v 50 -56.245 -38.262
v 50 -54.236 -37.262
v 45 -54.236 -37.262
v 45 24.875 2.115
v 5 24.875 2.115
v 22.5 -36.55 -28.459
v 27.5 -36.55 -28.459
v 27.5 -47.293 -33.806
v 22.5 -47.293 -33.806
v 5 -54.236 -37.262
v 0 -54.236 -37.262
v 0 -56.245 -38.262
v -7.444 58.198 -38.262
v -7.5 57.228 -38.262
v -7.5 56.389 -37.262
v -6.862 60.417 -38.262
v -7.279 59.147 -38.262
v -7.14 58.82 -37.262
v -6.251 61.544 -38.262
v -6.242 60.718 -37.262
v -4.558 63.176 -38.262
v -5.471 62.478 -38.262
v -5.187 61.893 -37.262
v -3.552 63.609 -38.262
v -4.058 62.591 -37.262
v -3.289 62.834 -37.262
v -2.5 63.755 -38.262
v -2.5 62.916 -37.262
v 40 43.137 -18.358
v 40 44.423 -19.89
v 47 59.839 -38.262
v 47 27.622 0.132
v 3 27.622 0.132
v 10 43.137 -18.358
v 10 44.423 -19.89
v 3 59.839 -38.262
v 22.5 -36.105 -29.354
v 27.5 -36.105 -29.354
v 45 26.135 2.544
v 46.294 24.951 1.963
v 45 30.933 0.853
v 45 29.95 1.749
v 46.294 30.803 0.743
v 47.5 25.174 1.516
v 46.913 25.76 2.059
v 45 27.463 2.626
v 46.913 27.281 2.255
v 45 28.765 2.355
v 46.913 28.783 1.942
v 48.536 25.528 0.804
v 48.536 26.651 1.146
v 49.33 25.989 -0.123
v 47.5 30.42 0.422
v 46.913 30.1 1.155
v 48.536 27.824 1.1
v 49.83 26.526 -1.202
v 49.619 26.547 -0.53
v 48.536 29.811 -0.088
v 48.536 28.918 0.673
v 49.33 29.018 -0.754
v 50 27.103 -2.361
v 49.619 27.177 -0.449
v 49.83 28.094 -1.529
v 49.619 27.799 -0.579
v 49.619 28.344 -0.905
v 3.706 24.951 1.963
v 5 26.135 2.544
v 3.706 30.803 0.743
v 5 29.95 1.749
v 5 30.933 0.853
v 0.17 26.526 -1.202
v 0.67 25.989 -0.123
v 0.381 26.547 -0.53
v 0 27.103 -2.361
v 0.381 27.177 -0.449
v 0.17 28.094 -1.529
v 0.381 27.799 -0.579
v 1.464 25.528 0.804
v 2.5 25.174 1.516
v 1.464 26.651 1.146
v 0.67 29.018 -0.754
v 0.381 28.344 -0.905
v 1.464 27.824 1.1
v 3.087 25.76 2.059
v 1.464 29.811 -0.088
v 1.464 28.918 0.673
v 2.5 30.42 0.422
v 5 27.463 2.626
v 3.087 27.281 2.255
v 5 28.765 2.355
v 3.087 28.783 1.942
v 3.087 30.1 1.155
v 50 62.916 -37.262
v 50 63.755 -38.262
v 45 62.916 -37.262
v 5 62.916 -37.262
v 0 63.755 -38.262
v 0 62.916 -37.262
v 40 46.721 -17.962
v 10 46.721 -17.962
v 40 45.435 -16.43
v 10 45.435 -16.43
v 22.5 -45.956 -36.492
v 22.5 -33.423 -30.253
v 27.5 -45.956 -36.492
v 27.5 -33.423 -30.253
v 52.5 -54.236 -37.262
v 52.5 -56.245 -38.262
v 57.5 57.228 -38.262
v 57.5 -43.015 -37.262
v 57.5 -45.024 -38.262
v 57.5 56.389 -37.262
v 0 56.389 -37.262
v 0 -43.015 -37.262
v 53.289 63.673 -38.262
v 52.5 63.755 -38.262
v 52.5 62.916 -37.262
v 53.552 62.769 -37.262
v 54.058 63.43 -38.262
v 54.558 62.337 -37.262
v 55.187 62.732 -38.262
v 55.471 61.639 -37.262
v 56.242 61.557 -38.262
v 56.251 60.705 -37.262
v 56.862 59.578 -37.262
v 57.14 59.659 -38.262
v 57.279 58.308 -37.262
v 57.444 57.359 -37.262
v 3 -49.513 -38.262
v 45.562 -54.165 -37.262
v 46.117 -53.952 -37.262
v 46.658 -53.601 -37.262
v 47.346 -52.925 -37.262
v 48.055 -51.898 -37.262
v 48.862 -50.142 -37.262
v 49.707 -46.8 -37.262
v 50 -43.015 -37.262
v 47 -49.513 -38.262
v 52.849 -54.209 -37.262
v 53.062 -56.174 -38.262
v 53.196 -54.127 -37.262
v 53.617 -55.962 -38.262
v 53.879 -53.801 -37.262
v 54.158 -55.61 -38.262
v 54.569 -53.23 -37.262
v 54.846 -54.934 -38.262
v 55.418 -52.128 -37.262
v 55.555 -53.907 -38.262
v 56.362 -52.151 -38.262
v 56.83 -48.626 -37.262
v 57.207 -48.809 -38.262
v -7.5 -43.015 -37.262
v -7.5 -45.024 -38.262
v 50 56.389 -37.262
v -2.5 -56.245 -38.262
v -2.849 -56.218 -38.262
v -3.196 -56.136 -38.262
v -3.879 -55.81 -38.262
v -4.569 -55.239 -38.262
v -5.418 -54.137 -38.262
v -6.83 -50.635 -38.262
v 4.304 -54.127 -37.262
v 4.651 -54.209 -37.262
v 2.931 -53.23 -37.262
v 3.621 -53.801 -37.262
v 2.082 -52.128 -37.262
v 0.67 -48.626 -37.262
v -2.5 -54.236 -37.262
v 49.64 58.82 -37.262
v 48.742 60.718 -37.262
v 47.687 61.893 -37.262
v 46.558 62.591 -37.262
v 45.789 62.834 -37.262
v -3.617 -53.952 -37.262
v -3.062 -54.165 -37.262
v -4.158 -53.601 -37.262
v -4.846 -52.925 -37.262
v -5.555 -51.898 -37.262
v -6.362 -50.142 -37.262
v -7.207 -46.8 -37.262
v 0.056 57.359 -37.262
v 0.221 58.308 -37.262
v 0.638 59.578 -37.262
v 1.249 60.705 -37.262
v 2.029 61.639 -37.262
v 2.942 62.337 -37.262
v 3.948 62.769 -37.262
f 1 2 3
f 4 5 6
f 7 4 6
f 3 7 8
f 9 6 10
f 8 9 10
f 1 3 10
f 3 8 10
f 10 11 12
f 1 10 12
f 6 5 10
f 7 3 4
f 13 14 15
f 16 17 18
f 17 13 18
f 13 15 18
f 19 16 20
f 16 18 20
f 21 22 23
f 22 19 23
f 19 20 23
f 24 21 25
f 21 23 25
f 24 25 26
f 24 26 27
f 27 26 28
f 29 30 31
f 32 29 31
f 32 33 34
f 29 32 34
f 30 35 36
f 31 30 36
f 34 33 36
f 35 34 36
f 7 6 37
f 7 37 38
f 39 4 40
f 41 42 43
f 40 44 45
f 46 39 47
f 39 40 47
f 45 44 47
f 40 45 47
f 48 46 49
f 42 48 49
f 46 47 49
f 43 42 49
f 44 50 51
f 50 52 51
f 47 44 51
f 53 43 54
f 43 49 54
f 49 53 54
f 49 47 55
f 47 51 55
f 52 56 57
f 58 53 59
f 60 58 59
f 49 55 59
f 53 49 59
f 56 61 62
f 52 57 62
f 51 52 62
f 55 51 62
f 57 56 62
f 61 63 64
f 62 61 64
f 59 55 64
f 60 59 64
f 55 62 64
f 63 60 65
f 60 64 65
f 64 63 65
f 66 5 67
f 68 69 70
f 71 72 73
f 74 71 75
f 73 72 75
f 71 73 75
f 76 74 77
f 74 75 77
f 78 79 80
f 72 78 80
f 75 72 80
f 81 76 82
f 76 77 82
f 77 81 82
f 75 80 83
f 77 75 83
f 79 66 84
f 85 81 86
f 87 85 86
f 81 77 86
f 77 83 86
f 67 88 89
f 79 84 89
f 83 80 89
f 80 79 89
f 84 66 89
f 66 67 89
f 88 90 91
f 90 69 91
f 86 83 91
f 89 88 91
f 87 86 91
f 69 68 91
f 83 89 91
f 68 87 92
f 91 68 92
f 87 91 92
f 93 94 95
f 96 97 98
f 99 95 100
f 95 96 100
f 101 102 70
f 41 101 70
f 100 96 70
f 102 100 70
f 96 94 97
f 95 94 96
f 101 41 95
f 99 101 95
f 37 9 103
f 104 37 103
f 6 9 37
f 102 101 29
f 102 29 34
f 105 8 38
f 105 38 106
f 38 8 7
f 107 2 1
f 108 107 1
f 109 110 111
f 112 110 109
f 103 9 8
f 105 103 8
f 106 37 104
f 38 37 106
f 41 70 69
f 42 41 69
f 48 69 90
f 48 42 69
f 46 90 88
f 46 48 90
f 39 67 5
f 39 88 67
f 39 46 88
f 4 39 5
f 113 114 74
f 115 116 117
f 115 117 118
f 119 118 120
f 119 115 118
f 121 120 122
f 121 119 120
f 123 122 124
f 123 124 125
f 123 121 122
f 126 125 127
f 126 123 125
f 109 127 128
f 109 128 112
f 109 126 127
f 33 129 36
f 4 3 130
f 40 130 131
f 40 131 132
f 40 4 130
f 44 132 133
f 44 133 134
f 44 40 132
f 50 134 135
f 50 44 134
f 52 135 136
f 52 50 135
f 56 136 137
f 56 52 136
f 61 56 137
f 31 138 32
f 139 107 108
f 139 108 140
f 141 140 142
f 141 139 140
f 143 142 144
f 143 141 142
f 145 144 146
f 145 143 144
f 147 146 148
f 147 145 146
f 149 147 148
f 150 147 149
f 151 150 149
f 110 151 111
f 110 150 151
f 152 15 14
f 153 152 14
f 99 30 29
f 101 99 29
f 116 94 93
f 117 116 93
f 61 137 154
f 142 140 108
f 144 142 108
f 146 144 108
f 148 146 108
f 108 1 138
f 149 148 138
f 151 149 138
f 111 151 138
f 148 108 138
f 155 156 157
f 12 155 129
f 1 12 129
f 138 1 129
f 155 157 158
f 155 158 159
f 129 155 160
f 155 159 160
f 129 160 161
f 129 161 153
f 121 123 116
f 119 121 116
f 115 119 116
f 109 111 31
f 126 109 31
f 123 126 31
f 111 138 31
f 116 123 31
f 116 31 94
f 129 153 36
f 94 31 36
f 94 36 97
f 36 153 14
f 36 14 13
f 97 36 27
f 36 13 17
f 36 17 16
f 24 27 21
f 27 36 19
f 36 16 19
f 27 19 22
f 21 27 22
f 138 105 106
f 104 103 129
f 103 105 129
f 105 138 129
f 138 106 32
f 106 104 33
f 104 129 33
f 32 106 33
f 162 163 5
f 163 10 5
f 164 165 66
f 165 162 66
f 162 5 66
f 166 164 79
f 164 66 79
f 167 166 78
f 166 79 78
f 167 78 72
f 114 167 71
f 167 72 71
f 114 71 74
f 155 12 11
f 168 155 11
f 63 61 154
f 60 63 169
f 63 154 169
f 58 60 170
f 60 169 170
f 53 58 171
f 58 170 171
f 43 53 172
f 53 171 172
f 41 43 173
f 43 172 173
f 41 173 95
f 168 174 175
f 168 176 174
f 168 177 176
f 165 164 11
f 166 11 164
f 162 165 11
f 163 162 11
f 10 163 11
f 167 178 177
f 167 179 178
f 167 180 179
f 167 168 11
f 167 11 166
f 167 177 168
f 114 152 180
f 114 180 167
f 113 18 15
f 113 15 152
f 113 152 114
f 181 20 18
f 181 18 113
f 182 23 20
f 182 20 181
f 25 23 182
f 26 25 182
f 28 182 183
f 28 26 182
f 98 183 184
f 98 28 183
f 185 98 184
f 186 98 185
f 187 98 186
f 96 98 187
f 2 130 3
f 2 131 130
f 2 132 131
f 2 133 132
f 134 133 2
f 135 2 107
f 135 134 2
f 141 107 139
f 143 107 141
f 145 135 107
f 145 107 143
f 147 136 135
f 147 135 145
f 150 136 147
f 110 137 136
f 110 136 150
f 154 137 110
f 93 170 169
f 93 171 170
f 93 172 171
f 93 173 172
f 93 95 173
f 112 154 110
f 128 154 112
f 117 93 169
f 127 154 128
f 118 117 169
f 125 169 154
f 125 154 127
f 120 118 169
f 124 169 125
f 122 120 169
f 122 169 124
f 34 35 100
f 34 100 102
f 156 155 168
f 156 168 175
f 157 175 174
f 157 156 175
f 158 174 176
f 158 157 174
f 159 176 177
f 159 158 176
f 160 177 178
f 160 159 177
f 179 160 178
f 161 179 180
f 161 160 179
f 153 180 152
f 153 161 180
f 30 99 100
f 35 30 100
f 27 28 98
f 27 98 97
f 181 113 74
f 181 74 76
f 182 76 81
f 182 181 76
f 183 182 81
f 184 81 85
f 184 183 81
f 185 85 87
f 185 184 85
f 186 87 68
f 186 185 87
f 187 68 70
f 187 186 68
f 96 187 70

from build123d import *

# Parameters (mm, degrees)
F1_DEPTH      = 50
F2_DEPTH      = 3
F4_DEPTH      = 3
F5_W          = 30
F5_H          = 2
F6_DEPTH      = 25
F7_W          = 5
F7_H          = 12
F8_DEPTH      = 25
F9_SIZE       = 2
F11_DEPTH     = 7.5
F12_T1_DEPTH  = 26.3054072893
F13_T1_DEPTH  = 27.2441766919
F15_DEPTH     = 7.5
F16_T1_DEPTH  = 26.3054072893
F17_T1_DEPTH  = 27.2441766919
F18_R         = 5
F19_T4_DEPTH  = 100.8695078042
F19_T7_ANGLE  = 76.4615865705
F19_T11_DEPTH = 62.2556275763
F20_T4_DEPTH  = 100.8695078042
F20_T9_DEPTH  = 62.2556275763
F20_T12_ANGLE = 76.4615865705


# Not quite as in the source:
# - a fillet or chamfer that OpenCascade refuses, or shapes differently, is made with other operations: its cross-section is extruded or revolved along the edge and cut away or added


with BuildPart() as f1:
    # F0 (on Right) → F1 (new body)
    with BuildSketch(Plane.YZ):
        Polygon((28.4014230277, 3.870410641), (-56.2452584396, -38.2620337305), (-49.5127283639, -38.2620337305), (27.6224404883, 0.1315944002), (59.8385196924, -38.2620337305), (63.7547415604, -38.2620337305), align=None)
    extrude(amount=F1_DEPTH)

    # F0 (on Right) → F2 (join)
    with BuildSketch(Plane.YZ):
        Polygon((27.6224404883, 0.1315944002), (-49.5127283639, -38.2620337305), (59.8385196924, -38.2620337305), align=None)
    extrude(amount=F2_DEPTH)

    # F3 (on face) → F4 (join)
    with BuildSketch(Plane.YZ.offset(50)):
        Polygon((27.6224404883, 0.1315944002), (-49.5127283639, -38.2620337305), (59.8385196924, -38.2620337305), align=None)
    extrude(amount=-F4_DEPTH)

    # F5 (on face) → F6 (cut)
    with BuildSketch(Plane(origin=(0, 18.5724443931, 15.5841312403), x_dir=(-1, 0, 0), z_dir=(0, 0.7660444431, 0.6427876097))):
        with Locations((-25, -42.7911762555)):
            Rectangle(F5_W, F5_H)
    extrude(amount=-F6_DEPTH, mode=Mode.SUBTRACT)

    # F7 (on face) → F8 (cut)
    with BuildSketch(Plane(origin=(0, 4.0953498153, -8.2278105741), x_dir=(1, 0, 0), z_dir=(0, -0.4455977123, 0.8952333097))):
        with Locations((25, -51.4021035664)):
            Rectangle(F7_W, F7_H)
    extrude(amount=-F8_DEPTH, mode=Mode.SUBTRACT)

    # F9
    f9_edges = [f1.edges().sort_by_distance(p)[0] for p in [
        (25, -35.213332, -31.144584),
    ]]
    chamfer(f9_edges, length=F9_SIZE)

    # F10 (on face) → F11 (join)
    with BuildSketch(Plane(origin=(0, 0, 0), x_dir=(0, -1, 0), z_dir=(-1, 0, 0))):
        Polygon((56.2452584396, -38.2620337305), (54.2361967122, -37.2620337305), (-62.9156419292, -37.2620337305), (-63.7547415604, -38.2620337305), align=None)
    extrude(amount=F11_DEPTH)

    # F12: fillet of radius 5 on 1 edges, made by hand

    # F12_s2 → F12_t1 (cut)
    with BuildSketch(Plane(origin=(0, 36.3083524151, -43.2706094318), x_dir=(1, 0, 0), z_dir=(0, 0.6427876097, -0.7660444431))):
        with BuildLine():
            ThreePointArc((-7.5, -19.2446042914), (-6.0355339059, -22.7801381974), (-2.5, -24.2446042914))
            Line((-2.5, -24.2446042914), (-7.5, -24.2446042914))
            Line((-7.5, -24.2446042914), (-7.5, -19.2446042914))
        make_face()
    extrude(amount=F12_T1_DEPTH, mode=Mode.SUBTRACT)

    # F13: fillet of radius 5 on 1 edges, made by hand

    # F13_s2 → F13_t1 (cut)
    with BuildSketch(Plane(origin=(0, -71.5310246258, -35.6041945608), x_dir=(1, 0, 0), z_dir=(0, 0.8952333097, 0.4455977123))):
        with BuildLine():
            ThreePointArc((-2.5, 9.1906886005), (-6.0355339059, 10.6551546946), (-7.5, 14.1906886005))
            Line((-7.5, 14.1906886005), (-7.5, 9.1906886005))
            Line((-7.5, 9.1906886005), (-2.5, 9.1906886005))
        make_face()
    extrude(amount=F13_T1_DEPTH, mode=Mode.SUBTRACT)

    # F14 (on face) → F15 (join)
    with BuildSketch(Plane.YZ.offset(50)):
        Polygon((63.7547415604, -38.2620337305), (62.9156419292, -37.2620337305), (-54.2361967122, -37.2620337305), (-56.2452584396, -38.2620337305), align=None)
    extrude(amount=F15_DEPTH)

    # F16: fillet of radius 5 on 1 edges, made by hand

    # F16_s2 → F16_t1 (cut)
    with BuildSketch(Plane(origin=(0, 53.2171422884, -63.4217205098), x_dir=(1, 0, 0), z_dir=(0, -0.6427876097, 0.7660444431))):
        with BuildLine():
            ThreePointArc((52.5, 24.2446042914), (56.0355339059, 22.7801381974), (57.5, 19.2446042914))
            Line((57.5, 19.2446042914), (57.5, 24.2446042914))
            Line((57.5, 24.2446042914), (52.5, 24.2446042914))
        make_face()
    extrude(amount=F16_T1_DEPTH, mode=Mode.SUBTRACT)

    # F17: fillet of radius 5 on 1 edges, made by hand

    # F17_s2 → F17_t1 (cut)
    with BuildSketch(Plane(origin=(0, -47.1411301566, -23.4642517522), x_dir=(1, 0, 0), z_dir=(0, -0.8952333097, -0.4455977123))):
        with BuildLine():
            ThreePointArc((52.5, -9.1906886005), (56.0355339059, -10.6551546946), (57.5, -14.1906886005))
            Line((57.5, -14.1906886005), (57.5, -9.1906886005))
            Line((57.5, -9.1906886005), (52.5, -9.1906886005))
        make_face()
    extrude(amount=F17_T1_DEPTH, mode=Mode.SUBTRACT)

    # F18
    f18_edges = [f1.edges().sort_by_distance(p)[0] for p in [
        (25, 28.401423, 3.870411),
    ]]
    fillet(f18_edges, radius=F18_R)

    # F19: fillet of radius 5 on 3 edges, made by hand


with BuildPart() as f19_tool2:
    # F19_s3 → F19_t4 (new body)
    with BuildSketch(Plane(origin=(0, 20.7797804184, 10.3430273622), x_dir=(1, 0, 0), z_dir=(0, -0.8952333097, -0.4455977123))):
        with BuildLine():
            ThreePointArc((45, -9.1906886005), (48.5355339059, -10.6551546946), (50, -14.1906886005))
            Line((50, -14.1906886005), (50, -9.1906886005))
            Line((50, -9.1906886005), (45, -9.1906886005))
        make_face()
    extrude(amount=F19_T4_DEPTH)

    split(bisect_by=Plane.XY.offset(-37.2620337305), keep=Keep.TOP)


with BuildPart() as f1_1:
    add(f1.part)

    # F19_t1: cut F19_tool2
    add(f19_tool2.part, mode=Mode.SUBTRACT)

    # F19_s6 → F19_t7 (revolve, cut)
    with BuildSketch(Plane(origin=(0, 20.7797804184, 10.3430273622), x_dir=(1, 0, 0), z_dir=(0, -0.8952333097, -0.4455977123))):
        with BuildLine():
            ThreePointArc((45, -9.1906886005), (48.5355339059, -10.6551546946), (50, -14.1906886005))
            Line((50, -14.1906886005), (50, -9.1906886005))
            Line((50, -9.1906886005), (45, -9.1906886005))
        make_face()
    revolve(axis=Axis((50, 27.1031187954, -2.3609497603), (-1, 0, 0)), revolution_arc=F19_T7_ANGLE, mode=Mode.SUBTRACT)


with BuildPart() as f19_tool9:
    # F19_s10 → F19_t11 (new body)
    with BuildSketch(Plane(origin=(0, 52.3780426572, -62.4217205098), x_dir=(1, 0, 0), z_dir=(0, -0.6427876097, 0.7660444431))):
        with BuildLine():
            ThreePointArc((50, 19.2446042914), (48.5355339059, 22.7801381974), (45, 24.2446042914))
            Line((45, 24.2446042914), (50, 24.2446042914))
            Line((50, 24.2446042914), (50, 19.2446042914))
        make_face()
    extrude(amount=F19_T11_DEPTH)

    split(bisect_by=Plane.XY.offset(-37.2620337305), keep=Keep.TOP)


with BuildPart() as f1_2:
    add(f1_1.part)

    # F19_t8: cut F19_tool9
    add(f19_tool9.part, mode=Mode.SUBTRACT)

    # F20: fillet of radius 5 on 3 edges, made by hand


with BuildPart() as f20_tool2:
    # F20_s3 → F20_t4 (new body)
    with BuildSketch(Plane(origin=(0, 20.7797804184, 10.3430273622), x_dir=(1, 0, 0), z_dir=(0, -0.8952333097, -0.4455977123))):
        with BuildLine():
            ThreePointArc((5, -9.1906886005), (1.4644660941, -10.6551546946), (0, -14.1906886005))
            Line((0, -14.1906886005), (0, -9.1906886005))
            Line((0, -9.1906886005), (5, -9.1906886005))
        make_face()
    extrude(amount=F20_T4_DEPTH)

    split(bisect_by=Plane.XY.offset(-37.2620337305), keep=Keep.TOP)


with BuildPart() as f1_3:
    add(f1_2.part)

    # F20_t1: cut F20_tool2
    add(f20_tool2.part, mode=Mode.SUBTRACT)


with BuildPart() as f20_tool7:
    # F20_s8 → F20_t9 (new body)
    with BuildSketch(Plane(origin=(0, 52.3780426572, -62.4217205098), x_dir=(1, 0, 0), z_dir=(0, -0.6427876097, 0.7660444431))):
        with BuildLine():
            ThreePointArc((0, 19.2446042914), (1.4644660941, 22.7801381974), (5, 24.2446042914))
            Line((5, 24.2446042914), (0, 24.2446042914))
            Line((0, 24.2446042914), (0, 19.2446042914))
        make_face()
    extrude(amount=F20_T9_DEPTH)

    split(bisect_by=Plane.XY.offset(-37.2620337305), keep=Keep.TOP)


with BuildPart() as f1_4:
    add(f1_3.part)

    # F20_t6: cut F20_tool7
    add(f20_tool7.part, mode=Mode.SUBTRACT)

    # F20_s11 → F20_t12 (revolve, cut)
    with BuildSketch(Plane(origin=(0, 20.7797804184, 10.3430273622), x_dir=(1, 0, 0), z_dir=(0, -0.8952333097, -0.4455977123))):
        with BuildLine():
            ThreePointArc((0, -14.1906886005), (1.4644660941, -10.6551546946), (5, -9.1906886005))
            Line((5, -9.1906886005), (0, -9.1906886005))
            Line((0, -9.1906886005), (0, -14.1906886005))
        make_face()
    revolve(axis=Axis((0, 27.1031187954, -2.3609497603), (-1, 0, 0)), revolution_arc=F20_T12_ANGLE, mode=Mode.SUBTRACT)


solid = f1_4.part
